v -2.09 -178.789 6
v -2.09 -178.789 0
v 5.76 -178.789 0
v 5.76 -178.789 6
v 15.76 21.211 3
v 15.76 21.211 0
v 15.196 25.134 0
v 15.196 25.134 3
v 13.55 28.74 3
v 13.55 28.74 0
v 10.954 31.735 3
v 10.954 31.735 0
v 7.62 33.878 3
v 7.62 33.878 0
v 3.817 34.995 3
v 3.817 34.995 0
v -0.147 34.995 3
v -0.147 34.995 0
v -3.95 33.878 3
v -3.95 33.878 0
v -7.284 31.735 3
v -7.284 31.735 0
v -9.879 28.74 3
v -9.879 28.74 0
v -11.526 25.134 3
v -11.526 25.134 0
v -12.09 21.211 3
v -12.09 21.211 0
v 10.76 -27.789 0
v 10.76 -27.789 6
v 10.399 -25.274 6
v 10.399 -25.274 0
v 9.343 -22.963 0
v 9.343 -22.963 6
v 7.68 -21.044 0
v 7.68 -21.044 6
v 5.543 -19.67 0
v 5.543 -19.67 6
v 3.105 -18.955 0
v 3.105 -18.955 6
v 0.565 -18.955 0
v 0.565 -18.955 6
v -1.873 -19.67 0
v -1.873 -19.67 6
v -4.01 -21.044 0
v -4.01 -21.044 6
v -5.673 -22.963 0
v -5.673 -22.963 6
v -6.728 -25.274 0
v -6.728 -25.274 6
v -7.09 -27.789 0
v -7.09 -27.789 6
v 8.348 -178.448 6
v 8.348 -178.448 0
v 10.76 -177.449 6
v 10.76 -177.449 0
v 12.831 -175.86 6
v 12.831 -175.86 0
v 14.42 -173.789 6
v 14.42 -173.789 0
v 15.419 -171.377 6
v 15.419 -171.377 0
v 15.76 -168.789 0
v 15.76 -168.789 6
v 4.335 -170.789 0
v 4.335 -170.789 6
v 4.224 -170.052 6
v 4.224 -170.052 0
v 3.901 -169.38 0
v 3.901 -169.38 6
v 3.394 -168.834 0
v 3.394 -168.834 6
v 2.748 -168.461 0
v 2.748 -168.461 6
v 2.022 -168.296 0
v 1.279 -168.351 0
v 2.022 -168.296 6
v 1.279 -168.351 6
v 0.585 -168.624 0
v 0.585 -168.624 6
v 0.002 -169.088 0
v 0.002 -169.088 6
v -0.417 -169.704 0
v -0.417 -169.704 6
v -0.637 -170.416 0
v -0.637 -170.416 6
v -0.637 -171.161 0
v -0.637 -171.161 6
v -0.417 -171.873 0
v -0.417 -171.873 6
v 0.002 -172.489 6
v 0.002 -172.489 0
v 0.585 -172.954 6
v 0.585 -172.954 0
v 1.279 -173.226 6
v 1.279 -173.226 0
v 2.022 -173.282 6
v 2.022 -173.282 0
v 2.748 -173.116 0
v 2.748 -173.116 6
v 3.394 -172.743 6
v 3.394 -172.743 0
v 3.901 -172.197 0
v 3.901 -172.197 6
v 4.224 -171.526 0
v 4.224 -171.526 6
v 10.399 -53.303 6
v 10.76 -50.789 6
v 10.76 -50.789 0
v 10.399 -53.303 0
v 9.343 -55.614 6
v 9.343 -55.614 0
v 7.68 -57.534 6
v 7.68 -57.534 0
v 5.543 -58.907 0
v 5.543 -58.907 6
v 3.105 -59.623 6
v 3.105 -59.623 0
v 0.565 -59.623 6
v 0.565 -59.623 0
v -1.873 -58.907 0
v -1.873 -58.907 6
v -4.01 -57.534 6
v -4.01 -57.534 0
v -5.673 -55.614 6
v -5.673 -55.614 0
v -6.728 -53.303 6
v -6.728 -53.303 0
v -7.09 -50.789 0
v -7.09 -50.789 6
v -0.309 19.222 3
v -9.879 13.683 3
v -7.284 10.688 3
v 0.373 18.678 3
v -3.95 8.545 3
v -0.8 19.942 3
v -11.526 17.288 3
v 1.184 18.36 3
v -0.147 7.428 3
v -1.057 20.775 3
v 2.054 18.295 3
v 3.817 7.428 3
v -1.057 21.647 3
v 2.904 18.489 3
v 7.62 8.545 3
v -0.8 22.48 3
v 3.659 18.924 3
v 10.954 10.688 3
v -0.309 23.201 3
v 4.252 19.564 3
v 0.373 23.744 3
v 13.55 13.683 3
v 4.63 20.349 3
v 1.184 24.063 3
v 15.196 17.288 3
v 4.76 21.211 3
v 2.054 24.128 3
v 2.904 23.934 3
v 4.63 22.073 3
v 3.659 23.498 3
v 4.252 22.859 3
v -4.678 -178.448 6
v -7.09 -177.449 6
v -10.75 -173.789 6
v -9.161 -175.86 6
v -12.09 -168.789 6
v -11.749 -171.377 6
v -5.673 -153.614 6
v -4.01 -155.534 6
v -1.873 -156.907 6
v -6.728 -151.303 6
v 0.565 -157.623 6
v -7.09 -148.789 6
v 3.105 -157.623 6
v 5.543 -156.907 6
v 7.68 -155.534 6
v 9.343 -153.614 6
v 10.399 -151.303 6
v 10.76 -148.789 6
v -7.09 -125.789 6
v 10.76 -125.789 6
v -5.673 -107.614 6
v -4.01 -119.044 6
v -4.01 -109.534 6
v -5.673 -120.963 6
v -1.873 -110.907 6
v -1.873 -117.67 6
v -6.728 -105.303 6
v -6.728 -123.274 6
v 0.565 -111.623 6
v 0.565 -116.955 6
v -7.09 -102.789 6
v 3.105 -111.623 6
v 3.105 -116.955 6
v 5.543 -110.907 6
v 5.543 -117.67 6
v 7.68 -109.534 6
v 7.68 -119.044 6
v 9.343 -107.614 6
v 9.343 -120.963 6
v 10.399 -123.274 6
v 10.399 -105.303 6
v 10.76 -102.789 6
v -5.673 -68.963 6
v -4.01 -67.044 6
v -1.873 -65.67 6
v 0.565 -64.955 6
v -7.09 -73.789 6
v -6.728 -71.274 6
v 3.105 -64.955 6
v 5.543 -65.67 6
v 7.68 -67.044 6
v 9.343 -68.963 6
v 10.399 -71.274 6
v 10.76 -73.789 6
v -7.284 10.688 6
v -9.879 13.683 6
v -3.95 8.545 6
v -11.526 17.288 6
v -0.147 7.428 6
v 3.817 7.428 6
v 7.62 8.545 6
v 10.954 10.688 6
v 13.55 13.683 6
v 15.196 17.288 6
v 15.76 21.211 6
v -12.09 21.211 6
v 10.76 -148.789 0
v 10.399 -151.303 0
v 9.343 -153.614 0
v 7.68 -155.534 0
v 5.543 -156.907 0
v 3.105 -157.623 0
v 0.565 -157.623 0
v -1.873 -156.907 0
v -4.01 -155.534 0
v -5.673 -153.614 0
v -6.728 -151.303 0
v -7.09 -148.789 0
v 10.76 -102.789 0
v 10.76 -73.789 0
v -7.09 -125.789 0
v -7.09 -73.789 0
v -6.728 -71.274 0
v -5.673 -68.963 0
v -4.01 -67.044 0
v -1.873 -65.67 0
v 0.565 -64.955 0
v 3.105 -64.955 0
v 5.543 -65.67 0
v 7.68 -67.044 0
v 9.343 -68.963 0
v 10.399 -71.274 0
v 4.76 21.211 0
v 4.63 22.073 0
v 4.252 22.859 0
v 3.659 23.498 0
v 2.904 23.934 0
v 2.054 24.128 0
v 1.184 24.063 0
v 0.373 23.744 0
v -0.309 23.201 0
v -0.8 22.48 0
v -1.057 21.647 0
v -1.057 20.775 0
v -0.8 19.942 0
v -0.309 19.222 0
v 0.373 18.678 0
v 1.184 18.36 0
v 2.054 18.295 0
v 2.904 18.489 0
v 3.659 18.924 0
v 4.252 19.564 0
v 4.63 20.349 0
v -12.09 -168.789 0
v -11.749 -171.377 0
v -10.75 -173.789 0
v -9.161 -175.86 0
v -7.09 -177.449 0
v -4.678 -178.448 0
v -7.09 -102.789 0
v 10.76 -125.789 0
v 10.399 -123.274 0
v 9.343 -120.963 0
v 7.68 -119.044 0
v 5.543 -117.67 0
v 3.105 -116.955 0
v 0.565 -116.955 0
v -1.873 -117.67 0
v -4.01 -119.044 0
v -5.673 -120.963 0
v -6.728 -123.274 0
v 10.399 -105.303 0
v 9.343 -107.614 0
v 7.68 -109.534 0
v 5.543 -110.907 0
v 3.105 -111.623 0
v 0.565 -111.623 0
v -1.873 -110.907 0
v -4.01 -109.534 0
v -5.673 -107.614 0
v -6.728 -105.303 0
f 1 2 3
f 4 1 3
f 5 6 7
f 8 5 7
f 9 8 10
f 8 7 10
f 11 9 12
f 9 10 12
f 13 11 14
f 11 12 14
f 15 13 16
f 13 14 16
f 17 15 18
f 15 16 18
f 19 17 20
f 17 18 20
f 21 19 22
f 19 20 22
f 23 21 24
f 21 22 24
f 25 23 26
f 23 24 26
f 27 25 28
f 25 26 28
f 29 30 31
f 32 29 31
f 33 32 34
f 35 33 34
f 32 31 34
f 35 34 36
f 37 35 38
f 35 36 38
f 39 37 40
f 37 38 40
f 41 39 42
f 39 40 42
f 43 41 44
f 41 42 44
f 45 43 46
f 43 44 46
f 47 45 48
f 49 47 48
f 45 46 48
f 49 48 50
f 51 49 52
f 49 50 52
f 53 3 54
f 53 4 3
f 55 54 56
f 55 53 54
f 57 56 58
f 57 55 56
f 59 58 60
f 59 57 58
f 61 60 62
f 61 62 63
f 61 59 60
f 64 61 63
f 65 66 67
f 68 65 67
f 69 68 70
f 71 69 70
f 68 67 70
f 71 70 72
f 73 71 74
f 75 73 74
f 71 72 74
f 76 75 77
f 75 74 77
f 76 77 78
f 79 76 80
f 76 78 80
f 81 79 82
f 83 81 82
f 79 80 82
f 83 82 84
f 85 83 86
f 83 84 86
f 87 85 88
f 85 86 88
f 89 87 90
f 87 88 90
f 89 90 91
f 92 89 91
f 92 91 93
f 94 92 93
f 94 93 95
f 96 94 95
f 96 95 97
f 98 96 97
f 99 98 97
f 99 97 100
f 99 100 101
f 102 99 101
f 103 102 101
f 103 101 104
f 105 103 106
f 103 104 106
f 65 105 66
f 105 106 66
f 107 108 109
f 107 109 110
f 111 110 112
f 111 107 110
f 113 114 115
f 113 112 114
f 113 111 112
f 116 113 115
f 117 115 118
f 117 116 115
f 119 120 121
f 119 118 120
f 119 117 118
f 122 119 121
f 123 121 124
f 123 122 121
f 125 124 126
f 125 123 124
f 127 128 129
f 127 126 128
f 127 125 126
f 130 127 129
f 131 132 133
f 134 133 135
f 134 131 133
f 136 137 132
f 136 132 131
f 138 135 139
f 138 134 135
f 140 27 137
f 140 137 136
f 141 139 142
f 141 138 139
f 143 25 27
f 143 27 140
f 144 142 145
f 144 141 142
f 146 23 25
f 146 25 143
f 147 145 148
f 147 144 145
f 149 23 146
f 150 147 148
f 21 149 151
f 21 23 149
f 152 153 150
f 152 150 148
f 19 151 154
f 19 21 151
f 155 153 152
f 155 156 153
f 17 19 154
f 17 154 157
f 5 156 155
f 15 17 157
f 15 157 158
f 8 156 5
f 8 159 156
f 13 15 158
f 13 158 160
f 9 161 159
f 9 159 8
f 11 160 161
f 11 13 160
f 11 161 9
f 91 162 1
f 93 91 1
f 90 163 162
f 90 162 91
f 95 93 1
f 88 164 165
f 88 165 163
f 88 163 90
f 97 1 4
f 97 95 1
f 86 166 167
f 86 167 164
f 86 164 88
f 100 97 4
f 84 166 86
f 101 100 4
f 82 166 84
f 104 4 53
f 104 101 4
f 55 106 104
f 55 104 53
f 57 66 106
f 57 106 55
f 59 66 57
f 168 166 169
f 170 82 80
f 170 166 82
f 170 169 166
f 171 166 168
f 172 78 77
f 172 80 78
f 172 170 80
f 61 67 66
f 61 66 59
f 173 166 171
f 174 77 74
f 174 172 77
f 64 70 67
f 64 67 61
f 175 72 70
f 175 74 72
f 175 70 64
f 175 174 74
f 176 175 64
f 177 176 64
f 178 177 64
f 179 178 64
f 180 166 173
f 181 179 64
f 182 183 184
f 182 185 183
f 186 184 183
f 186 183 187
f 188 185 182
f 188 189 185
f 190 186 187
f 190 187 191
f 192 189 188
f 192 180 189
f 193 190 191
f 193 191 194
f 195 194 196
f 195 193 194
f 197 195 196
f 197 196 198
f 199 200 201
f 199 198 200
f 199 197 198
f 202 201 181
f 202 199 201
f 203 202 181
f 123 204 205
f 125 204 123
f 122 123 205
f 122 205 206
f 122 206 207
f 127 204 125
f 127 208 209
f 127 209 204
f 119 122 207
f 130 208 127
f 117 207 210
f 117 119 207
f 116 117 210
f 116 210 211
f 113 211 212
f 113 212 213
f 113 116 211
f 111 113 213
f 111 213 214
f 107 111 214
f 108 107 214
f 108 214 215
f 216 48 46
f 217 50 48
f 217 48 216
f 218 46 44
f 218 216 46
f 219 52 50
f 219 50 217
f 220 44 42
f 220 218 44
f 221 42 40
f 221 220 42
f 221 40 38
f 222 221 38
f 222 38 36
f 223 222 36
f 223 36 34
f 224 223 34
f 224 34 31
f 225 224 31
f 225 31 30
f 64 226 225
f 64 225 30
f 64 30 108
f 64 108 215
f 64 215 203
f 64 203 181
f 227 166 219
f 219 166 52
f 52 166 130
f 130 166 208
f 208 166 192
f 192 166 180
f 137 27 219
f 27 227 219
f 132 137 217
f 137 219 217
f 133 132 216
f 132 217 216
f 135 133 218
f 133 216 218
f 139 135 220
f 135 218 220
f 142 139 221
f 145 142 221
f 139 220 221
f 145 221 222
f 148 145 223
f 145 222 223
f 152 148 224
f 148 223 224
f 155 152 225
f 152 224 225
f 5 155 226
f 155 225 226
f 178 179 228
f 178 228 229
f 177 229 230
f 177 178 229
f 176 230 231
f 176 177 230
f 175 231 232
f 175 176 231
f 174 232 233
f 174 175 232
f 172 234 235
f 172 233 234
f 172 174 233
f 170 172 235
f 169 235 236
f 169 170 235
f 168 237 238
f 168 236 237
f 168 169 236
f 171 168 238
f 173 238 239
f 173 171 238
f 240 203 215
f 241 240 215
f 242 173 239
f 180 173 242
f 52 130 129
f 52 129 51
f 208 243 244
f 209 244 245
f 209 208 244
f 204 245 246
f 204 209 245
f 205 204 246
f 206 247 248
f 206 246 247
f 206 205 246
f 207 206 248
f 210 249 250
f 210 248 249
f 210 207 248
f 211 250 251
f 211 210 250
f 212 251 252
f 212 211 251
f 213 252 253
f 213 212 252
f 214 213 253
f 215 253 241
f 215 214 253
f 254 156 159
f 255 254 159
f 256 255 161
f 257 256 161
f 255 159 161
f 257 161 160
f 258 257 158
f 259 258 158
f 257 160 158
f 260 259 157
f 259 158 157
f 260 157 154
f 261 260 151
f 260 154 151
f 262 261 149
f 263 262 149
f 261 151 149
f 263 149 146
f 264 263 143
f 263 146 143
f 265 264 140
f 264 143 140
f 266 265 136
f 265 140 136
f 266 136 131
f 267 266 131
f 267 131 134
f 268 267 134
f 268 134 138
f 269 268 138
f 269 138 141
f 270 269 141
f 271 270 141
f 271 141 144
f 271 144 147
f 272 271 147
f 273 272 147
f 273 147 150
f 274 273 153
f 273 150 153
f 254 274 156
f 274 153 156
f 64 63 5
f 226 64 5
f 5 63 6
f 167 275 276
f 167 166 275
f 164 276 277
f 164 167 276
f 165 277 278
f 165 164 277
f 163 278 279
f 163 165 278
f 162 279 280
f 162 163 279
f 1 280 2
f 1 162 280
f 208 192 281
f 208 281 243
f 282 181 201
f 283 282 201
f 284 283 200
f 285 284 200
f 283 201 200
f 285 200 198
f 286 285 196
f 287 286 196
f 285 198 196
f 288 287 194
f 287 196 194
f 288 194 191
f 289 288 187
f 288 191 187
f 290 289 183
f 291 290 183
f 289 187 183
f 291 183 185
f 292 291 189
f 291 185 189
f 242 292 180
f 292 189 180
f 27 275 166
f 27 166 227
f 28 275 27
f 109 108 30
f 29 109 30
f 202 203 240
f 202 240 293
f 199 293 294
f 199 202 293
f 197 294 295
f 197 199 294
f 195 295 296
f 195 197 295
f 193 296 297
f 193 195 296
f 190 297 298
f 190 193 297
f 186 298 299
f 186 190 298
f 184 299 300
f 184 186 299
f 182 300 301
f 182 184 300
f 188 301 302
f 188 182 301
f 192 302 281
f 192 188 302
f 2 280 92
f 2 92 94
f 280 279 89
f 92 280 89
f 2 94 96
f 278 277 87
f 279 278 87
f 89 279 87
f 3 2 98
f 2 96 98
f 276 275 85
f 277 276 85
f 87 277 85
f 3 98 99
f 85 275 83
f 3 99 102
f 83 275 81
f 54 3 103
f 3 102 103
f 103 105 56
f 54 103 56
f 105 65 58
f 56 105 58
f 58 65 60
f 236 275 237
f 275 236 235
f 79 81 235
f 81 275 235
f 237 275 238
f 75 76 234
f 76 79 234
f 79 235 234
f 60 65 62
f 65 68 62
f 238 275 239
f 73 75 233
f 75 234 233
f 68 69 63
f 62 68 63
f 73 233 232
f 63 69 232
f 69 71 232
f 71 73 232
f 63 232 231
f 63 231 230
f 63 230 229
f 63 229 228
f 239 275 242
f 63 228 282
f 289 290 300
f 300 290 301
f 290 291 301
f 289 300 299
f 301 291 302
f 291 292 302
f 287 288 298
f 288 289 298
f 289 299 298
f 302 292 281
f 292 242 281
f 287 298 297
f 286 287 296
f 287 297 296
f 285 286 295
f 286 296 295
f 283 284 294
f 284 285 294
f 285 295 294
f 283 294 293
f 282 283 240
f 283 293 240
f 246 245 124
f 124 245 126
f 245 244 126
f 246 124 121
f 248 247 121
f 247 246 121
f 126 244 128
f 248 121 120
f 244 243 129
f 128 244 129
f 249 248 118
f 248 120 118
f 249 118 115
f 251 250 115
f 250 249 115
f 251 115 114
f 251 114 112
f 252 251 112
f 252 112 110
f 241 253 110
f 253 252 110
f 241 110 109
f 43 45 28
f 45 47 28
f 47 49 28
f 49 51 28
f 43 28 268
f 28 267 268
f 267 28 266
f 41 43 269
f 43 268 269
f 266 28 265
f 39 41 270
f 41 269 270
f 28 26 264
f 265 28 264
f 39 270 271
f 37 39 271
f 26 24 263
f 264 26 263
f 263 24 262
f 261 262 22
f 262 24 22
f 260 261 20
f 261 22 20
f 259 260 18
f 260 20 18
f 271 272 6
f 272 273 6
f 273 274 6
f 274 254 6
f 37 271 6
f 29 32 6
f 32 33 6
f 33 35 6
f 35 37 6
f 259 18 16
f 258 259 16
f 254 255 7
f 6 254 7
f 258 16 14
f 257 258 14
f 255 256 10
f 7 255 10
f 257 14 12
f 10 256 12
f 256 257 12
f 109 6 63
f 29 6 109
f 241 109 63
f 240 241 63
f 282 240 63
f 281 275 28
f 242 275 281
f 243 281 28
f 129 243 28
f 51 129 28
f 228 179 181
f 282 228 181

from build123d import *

# Parameters (mm, degrees)
ESQUISSE1_W             = 27.85
ESQUISSE1_H             = 200
BOSS_EXTRU_2_DEPTH      = 6
ESQUISSE3_R             = 2.5
ENL_V_MAT_EXTRU_1_DEPTH = 6
ESQUISSE4_R             = 13.925
ENL_V_MAT_EXTRU_2_DEPTH = 3
ESQUISSE5_R             = 2.925
ENL_V_MAT_EXTRU_3_DEPTH = 3
ESQUISSE6_W             = 17.85
ESQUISSE6_H             = 23
ESQUISSE6_H_2           = 29
ENL_V_MAT_EXTRU_4_DEPTH = 10
CONG_1_R                = 10
CONG_2_R                = 10


with BuildPart() as part:
    # Esquisse1 → Boss.-Extru.2 (new body)
    with BuildSketch(Plane.XY):
        with Locations((1.835077519, -78.788662791)):
            Rectangle(ESQUISSE1_W, ESQUISSE1_H)
        with BuildLine():
            Line((-12.089922481, 21.211337209), (15.760077519, 21.211337209))
            ThreePointArc((15.760077519, 21.211337209), (1.835077519, 35.136337209), (-12.089922481, 21.211337209))
        make_face()
    extrude(amount=BOSS_EXTRU_2_DEPTH)

    # Esquisse3 → Enlèv. mat.-Extru.1 (cut)
    with BuildSketch(Plane.XY.offset(6)):
        with Locations((1.835077519, -170.788662791)):
            Circle(ESQUISSE3_R)
    extrude(amount=-ENL_V_MAT_EXTRU_1_DEPTH, mode=Mode.SUBTRACT)

    # Esquisse4 → Enlèv. mat.-Extru.2 (cut)
    with BuildSketch(Plane.XY.offset(6)):
        with Locations((1.835077519, 21.211337209)):
            Circle(ESQUISSE4_R)
    extrude(amount=-ENL_V_MAT_EXTRU_2_DEPTH, mode=Mode.SUBTRACT)

    # Esquisse5 → Enlèv. mat.-Extru.3 (cut)
    with BuildSketch(Plane.XY.offset(3)):
        with Locations((1.835077519, 21.211337209)):
            Circle(ESQUISSE5_R)
    extrude(amount=-ENL_V_MAT_EXTRU_3_DEPTH, mode=Mode.SUBTRACT)

    # Esquisse6 → Enlèv. mat.-Extru.4 (cut)
    with BuildSketch(Plane.XY.offset(6)):
        with BuildLine():
            Line((-7.089922481, -27.788662791), (10.760077519, -27.788662791))
            ThreePointArc((10.760077519, -27.788662791), (1.835077519, -18.863662791), (-7.089922481, -27.788662791))
        make_face()
        with Locations((1.835077519, -39.288662791)):
            Rectangle(ESQUISSE6_W, ESQUISSE6_H)
        with BuildLine():
            Line((-7.089922481, -50.788662791), (10.760077519, -50.788662791))
            ThreePointArc((10.760077519, -50.788662791), (1.835077519, -59.713662791), (-7.089922481, -50.788662791))
        make_face()
        with BuildLine():
            ThreePointArc((-7.089922481, -73.788662791), (1.835077519, -64.863662791), (10.760077519, -73.788662791))
            Line((10.760077519, -73.788662791), (-7.089922481, -73.788662791))
        make_face()
        with Locations((1.835077519, -88.288662791)):
            Rectangle(ESQUISSE6_W, ESQUISSE6_H_2)
        with BuildLine():
            Line((-7.089922481, -102.788662791), (10.760077519, -102.788662791))
            ThreePointArc((10.760077519, -102.788662791), (1.835077519, -111.713662791), (-7.089922481, -102.788662791))
        make_face()
        with BuildLine():
            Line((-7.089922481, -125.788662791), (10.760077519, -125.788662791))
            ThreePointArc((10.760077519, -125.788662791), (1.835077519, -116.863662791), (-7.089922481, -125.788662791))
        make_face()
        with Locations((1.835077519, -137.288662791)):
            Rectangle(ESQUISSE6_W, ESQUISSE6_H)
        with BuildLine():
            Line((-7.089922481, -148.788662791), (10.760077519, -148.788662791))
            ThreePointArc((10.760077519, -148.788662791), (1.835077519, -157.713662791), (-7.089922481, -148.788662791))
        make_face()
    extrude(amount=-ENL_V_MAT_EXTRU_4_DEPTH, mode=Mode.SUBTRACT)

    # Congé1
    cong_1_edges = [part.edges().sort_by_distance(p)[0] for p in [
        (-12.089922481, -178.788662791, 3),
    ]]
    fillet(cong_1_edges, radius=CONG_1_R)

    # Congé2
    cong_2_edges = [part.edges().sort_by_distance(p)[0] for p in [
        (15.760077519, -178.788662791, 3),
    ]]
    fillet(cong_2_edges, radius=CONG_2_R)


solid = part.part
